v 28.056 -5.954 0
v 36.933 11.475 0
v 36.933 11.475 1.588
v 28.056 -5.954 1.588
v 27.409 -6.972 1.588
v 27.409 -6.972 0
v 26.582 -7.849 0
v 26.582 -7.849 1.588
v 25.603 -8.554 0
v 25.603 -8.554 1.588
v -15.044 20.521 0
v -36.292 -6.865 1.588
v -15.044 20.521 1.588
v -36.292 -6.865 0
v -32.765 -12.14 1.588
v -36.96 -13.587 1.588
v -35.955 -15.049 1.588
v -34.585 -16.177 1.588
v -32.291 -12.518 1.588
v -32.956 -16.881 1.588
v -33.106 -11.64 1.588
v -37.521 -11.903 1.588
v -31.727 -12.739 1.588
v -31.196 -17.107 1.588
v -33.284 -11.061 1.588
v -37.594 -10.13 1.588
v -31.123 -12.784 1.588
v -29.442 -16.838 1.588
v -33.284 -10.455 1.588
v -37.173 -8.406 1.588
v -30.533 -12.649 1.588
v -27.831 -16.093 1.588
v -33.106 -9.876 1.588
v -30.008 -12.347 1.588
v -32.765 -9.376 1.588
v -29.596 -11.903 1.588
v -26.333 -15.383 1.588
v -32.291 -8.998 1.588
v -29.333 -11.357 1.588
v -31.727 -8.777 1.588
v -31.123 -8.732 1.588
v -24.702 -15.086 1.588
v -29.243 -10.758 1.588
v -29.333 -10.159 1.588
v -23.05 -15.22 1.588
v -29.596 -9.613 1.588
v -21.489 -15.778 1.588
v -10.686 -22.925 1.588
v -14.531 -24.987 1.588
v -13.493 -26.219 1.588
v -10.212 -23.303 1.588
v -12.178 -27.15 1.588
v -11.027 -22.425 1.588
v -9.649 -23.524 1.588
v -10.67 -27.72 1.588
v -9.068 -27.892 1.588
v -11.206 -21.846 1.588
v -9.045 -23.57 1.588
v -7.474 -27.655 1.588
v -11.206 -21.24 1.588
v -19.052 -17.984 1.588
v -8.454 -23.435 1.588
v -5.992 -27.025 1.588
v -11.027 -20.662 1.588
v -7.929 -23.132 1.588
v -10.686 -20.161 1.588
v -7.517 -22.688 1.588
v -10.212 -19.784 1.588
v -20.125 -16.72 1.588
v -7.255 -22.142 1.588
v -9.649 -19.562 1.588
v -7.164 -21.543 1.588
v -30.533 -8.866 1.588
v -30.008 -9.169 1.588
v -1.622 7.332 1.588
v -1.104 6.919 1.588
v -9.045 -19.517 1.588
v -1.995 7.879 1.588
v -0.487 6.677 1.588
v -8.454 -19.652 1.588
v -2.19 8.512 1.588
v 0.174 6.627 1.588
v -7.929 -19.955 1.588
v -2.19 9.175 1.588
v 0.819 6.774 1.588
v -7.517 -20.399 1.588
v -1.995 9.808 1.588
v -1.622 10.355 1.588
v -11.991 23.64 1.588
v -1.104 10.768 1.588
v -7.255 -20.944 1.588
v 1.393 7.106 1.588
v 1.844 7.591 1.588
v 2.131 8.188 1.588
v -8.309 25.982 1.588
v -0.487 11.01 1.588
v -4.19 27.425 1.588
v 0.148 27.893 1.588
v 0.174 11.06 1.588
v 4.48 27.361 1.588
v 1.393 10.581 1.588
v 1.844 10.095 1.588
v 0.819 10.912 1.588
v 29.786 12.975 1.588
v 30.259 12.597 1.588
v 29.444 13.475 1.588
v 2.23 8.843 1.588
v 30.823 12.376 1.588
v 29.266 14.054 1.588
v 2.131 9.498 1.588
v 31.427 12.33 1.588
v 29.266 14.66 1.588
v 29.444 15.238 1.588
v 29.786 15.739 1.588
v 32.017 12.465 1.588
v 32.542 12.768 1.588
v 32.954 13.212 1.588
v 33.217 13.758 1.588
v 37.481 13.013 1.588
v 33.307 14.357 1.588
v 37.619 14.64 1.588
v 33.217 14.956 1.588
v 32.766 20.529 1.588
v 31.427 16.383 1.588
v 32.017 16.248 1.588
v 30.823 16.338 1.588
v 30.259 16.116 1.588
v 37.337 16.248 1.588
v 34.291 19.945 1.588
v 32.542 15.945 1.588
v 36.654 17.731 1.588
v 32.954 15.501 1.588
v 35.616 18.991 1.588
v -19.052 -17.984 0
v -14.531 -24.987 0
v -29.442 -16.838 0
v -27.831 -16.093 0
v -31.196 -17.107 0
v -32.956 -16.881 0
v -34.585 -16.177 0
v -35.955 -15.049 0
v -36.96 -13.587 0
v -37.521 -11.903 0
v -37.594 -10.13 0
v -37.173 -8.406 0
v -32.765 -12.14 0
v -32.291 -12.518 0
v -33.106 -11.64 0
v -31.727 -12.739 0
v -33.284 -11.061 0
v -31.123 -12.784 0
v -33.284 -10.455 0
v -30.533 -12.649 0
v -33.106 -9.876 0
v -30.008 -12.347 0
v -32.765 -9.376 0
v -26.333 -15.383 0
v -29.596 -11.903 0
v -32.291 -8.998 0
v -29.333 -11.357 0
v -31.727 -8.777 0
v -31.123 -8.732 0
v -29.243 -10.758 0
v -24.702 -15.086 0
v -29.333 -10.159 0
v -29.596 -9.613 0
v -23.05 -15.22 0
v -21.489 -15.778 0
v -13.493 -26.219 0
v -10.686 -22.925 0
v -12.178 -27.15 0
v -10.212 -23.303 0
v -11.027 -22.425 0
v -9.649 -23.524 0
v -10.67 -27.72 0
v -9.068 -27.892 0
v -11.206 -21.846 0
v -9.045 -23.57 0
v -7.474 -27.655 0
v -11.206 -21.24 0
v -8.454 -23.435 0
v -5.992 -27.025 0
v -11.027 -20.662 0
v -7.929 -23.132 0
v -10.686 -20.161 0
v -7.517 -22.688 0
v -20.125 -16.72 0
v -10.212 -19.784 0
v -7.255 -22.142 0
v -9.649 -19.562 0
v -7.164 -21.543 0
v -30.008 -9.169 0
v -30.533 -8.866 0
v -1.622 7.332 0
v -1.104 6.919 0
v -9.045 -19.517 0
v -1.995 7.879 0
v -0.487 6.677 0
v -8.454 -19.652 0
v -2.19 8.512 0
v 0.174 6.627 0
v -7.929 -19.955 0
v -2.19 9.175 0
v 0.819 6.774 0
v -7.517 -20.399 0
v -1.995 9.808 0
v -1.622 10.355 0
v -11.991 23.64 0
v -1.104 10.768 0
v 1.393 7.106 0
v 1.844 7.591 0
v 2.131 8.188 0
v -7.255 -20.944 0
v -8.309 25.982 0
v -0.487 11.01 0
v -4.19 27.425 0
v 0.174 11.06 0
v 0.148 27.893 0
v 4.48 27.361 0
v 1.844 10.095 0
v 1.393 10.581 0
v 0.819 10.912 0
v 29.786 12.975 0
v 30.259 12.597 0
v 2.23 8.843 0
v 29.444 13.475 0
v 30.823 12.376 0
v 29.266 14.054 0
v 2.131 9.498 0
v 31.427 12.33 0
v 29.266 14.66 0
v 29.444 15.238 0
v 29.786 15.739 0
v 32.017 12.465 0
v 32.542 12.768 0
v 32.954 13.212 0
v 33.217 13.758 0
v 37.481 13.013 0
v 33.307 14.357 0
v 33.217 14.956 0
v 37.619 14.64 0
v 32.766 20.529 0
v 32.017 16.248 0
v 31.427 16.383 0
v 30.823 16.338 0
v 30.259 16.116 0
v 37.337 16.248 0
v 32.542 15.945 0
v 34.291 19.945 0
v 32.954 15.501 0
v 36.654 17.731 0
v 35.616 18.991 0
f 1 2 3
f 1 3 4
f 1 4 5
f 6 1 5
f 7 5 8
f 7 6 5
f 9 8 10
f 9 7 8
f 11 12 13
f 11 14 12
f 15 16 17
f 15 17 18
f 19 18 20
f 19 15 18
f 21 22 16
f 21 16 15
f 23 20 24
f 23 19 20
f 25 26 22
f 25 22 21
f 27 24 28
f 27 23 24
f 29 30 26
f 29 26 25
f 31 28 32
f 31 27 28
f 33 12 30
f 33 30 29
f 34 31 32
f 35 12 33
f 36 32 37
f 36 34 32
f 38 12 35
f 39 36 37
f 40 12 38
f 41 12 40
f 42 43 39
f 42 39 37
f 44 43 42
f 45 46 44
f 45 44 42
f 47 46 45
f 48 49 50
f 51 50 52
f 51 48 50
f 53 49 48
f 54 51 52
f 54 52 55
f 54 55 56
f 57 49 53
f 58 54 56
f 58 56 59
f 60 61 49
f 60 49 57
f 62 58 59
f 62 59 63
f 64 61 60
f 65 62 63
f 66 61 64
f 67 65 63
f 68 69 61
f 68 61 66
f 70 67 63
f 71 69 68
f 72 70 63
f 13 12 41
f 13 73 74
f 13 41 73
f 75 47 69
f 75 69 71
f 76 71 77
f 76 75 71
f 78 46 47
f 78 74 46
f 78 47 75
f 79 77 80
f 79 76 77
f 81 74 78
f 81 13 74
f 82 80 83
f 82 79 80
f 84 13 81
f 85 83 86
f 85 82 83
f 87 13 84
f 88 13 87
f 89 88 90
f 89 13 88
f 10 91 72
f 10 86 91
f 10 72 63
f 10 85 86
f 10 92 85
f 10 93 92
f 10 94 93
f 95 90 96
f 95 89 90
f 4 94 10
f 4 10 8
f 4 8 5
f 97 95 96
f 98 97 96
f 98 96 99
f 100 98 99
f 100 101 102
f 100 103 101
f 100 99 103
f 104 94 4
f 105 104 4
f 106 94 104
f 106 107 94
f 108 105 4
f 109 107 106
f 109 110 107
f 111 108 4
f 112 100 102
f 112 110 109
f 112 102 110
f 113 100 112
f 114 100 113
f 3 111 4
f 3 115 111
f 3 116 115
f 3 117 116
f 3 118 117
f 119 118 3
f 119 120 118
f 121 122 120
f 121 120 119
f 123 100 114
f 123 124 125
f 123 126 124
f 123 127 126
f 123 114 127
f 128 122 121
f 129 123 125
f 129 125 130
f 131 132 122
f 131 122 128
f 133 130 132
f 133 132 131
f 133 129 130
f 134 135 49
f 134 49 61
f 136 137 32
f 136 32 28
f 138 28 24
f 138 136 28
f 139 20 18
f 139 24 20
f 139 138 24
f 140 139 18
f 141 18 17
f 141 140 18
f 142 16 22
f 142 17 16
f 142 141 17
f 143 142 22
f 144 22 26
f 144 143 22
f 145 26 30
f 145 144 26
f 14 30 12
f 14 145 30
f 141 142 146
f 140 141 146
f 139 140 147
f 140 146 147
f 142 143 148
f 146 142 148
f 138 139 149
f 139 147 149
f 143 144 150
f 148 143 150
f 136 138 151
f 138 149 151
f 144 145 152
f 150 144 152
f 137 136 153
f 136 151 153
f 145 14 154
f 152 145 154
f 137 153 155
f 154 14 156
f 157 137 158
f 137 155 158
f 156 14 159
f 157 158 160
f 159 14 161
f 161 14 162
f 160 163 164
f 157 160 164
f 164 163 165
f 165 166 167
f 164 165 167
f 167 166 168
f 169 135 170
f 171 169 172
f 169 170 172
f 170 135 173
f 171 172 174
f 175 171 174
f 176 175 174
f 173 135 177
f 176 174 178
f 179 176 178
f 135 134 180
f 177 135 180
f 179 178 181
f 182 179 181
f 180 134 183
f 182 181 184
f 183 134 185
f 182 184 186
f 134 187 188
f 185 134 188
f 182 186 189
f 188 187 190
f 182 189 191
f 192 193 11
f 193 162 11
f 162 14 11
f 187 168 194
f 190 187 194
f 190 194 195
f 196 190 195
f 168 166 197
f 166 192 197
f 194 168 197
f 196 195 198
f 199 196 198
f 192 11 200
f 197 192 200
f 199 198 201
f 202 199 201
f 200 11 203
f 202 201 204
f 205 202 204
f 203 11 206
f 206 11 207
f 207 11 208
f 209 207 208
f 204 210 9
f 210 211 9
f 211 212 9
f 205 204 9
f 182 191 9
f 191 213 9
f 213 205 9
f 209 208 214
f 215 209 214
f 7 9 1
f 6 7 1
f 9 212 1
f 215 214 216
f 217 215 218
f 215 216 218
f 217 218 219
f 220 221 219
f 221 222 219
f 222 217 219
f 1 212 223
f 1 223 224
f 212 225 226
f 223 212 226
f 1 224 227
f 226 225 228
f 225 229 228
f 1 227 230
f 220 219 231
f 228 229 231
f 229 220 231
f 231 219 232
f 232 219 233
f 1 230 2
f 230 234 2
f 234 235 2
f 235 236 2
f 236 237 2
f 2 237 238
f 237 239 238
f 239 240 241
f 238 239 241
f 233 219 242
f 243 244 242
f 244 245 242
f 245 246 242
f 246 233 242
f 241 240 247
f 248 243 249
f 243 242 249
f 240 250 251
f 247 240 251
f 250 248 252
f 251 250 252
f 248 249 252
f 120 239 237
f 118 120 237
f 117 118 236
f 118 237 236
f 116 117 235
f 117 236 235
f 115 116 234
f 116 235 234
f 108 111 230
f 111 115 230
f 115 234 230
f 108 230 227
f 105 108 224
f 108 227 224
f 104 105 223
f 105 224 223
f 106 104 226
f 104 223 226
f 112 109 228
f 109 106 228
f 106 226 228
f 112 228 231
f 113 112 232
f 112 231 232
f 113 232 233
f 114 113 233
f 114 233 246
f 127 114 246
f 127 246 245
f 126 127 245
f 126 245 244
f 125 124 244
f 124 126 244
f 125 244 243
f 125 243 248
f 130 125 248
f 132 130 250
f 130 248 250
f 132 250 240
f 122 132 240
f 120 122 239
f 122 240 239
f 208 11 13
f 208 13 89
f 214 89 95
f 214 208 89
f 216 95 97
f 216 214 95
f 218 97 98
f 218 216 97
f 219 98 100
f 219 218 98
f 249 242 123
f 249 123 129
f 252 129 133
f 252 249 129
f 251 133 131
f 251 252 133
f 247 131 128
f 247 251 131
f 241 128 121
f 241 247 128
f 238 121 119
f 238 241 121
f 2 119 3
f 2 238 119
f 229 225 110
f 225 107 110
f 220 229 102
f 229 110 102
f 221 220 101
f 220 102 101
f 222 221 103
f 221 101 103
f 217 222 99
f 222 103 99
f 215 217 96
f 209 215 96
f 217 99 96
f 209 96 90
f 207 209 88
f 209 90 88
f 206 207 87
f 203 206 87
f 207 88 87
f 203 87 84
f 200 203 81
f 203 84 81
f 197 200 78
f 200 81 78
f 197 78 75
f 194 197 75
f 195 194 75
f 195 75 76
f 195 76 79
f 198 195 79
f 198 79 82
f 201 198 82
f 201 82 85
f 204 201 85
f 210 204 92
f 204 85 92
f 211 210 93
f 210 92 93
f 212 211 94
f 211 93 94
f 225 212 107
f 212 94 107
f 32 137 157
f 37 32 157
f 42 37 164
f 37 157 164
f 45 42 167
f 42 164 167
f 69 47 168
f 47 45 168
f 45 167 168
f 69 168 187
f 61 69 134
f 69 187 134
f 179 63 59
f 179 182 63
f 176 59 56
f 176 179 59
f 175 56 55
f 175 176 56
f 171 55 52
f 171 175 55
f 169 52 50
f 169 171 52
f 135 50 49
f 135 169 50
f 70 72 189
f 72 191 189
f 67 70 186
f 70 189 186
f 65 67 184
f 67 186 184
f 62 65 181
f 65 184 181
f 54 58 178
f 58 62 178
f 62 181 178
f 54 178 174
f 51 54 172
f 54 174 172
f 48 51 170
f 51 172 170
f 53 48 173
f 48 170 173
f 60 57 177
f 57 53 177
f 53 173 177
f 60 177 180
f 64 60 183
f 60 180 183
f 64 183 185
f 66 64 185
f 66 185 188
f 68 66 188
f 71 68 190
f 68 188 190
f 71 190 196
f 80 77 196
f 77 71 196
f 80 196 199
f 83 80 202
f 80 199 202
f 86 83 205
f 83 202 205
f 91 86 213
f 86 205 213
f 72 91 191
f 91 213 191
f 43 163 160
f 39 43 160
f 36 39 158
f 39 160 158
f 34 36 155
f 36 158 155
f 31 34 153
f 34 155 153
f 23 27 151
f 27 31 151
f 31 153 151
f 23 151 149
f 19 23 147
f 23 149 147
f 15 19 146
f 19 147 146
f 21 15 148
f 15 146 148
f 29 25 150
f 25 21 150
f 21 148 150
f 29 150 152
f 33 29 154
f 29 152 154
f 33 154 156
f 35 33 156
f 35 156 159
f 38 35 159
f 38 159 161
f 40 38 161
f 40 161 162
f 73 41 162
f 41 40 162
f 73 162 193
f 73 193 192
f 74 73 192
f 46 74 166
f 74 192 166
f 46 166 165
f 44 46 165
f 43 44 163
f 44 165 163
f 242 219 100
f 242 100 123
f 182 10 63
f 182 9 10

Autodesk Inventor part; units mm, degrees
ref_plane "YZ Plane" through (0, 0, 0) normal (1, 0, 0) x (0, 1, 0)
ref_plane "XZ Plane" through (0, 0, 0) normal (0, 1, 0) x (-1, 0, 0)
ref_plane "Work Plane1" through (0, 0, 0) normal (0, 0, 1) x (1, 0, 0)
sketch "Sketch1" plane through (0, 0, 0) normal (0, 0, 1) x (1, 0, 0)
  circle A0 centre (31.2751, 14.3567) radius 2.032
  circle A1 centre (-31.2751, -10.7579) radius 2.032
  circle A2 centre (-9.1964, -21.5433) radius 2.032
  line L0 (4.4799, 27.3609) -> (32.7659, 20.5292)
  arc A3 (4.4799, 27.3609) -> (-15.0435, 20.5211) centre (0.0075, 8.8433) ccw
  line L1 (-36.2921, -6.8653) -> (-15.0435, 20.5211)
  arc A4 (-36.2921, -6.8653) -> (-27.8312, -16.0929) centre (-31.2751, -10.7579) ccw
  arc A5 (-19.0523, -17.9839) -> (-27.8312, -16.0929) centre (-24.3873, -21.4279) ccw
  line L2 (-14.5314, -24.9873) -> (-19.0523, -17.9839)
  arc A6 (36.9334, 11.4747) -> (32.7659, 20.5292) centre (31.2751, 14.3567) ccw
  arc A7 (-14.5314, -24.9873) -> (-5.9915, -27.0252) centre (-9.1964, -21.5433) ccw
  arc A8 (25.6029, -8.5539) -> (28.0563, -5.954) centre (22.398, -3.072) ccw
  circle A9 centre (22.398, -3.072) radius 2.032 construction
  line L3 (36.9334, 11.4747) -> (28.0563, -5.954)
  line L4 (25.6029, -8.5539) -> (-5.9915, -27.0252)
  line L5 (72.5061, 7.5054) -> (72.5061, 11.8054)
  circle A10 centre (0.0075, 8.8433) radius 2.2225
  point P0 (0, 0)
  dimension "d14" = 4.064
  dimension "d16" = 4.445
extrude "Plate3" add sketch "Sketch1" along normal blind 1.5875 contours L0 A6 L3 A8 L4 A7 L2 A5 A4 L1 A3 | A10
sketch "Sketch2" plane through (0, 0, 1.5875) normal (0, 0, 1) x (1, 0, 0)
  arc A0 (-36.2921, -6.8653) -> (-27.8312, -16.0929) centre (-31.2751, -10.7579) ccw projected
  circle A1 centre (-31.2751, -10.7579) radius 2.032 projected
  line L0 (-36.2921, -6.8653) -> (-15.0435, 20.5211) projected
  arc A2 (4.4799, 27.3609) -> (-15.0435, 20.5211) centre (0.0075, 8.8433) ccw projected
  line L1 (4.4799, 27.3609) -> (32.7659, 20.5292) projected
  arc A3 (36.9334, 11.4747) -> (32.7659, 20.5292) centre (31.2751, 14.3567) ccw projected
  circle A4 centre (31.2751, 14.3567) radius 2.032 projected
  line L2 (36.9334, 11.4747) -> (28.0563, -5.954) projected
  arc A5 (25.6029, -8.5539) -> (28.0563, -5.954) centre (22.398, -3.072) ccw projected
  line L3 (25.6029, -8.5539) -> (-5.9915, -27.0252) projected
  arc A6 (-14.5314, -24.9873) -> (-5.9915, -27.0252) centre (-9.1964, -21.5433) ccw projected
  line L4 (-14.5314, -24.9873) -> (-19.0523, -17.9839) projected
  arc A7 (-19.0523, -17.9839) -> (-27.8312, -16.0929) centre (-24.3873, -21.4279) ccw projected
  circle A8 centre (-9.1964, -21.5433) radius 2.032 projected
  circle A9 centre (0.0075, 8.8433) radius 2.2225
  point P0 (0, 0)
  dimension "d17" = 4.445
extrude "Extrusion1" cut sketch "Sketch2" against normal blind 38.1 contours A9
equation "\"d15\" = Thickness"
equation "\"BendRadius\" = Thickness"
equation "\"BendReliefWidth\" = Thickness"
equation "\"BendReliefDepth\" = 0.5 * Thickness"
equation "\"CornerReliefSize\" = 4 * Thickness"
equation "\"MinimumRemnant\" = 2 * Thickness"
equation "\"TransitionRadius\" = BendRadius"
equation "\"JacobiRadiusSize\" = BendRadius"
equation "\"GapSize\" = Thickness"
equation "\"Thickness\" = 1.5875"
properties part number "Front Horizontal Odom Pod Rot Side" material "Acetal Resin, White"
